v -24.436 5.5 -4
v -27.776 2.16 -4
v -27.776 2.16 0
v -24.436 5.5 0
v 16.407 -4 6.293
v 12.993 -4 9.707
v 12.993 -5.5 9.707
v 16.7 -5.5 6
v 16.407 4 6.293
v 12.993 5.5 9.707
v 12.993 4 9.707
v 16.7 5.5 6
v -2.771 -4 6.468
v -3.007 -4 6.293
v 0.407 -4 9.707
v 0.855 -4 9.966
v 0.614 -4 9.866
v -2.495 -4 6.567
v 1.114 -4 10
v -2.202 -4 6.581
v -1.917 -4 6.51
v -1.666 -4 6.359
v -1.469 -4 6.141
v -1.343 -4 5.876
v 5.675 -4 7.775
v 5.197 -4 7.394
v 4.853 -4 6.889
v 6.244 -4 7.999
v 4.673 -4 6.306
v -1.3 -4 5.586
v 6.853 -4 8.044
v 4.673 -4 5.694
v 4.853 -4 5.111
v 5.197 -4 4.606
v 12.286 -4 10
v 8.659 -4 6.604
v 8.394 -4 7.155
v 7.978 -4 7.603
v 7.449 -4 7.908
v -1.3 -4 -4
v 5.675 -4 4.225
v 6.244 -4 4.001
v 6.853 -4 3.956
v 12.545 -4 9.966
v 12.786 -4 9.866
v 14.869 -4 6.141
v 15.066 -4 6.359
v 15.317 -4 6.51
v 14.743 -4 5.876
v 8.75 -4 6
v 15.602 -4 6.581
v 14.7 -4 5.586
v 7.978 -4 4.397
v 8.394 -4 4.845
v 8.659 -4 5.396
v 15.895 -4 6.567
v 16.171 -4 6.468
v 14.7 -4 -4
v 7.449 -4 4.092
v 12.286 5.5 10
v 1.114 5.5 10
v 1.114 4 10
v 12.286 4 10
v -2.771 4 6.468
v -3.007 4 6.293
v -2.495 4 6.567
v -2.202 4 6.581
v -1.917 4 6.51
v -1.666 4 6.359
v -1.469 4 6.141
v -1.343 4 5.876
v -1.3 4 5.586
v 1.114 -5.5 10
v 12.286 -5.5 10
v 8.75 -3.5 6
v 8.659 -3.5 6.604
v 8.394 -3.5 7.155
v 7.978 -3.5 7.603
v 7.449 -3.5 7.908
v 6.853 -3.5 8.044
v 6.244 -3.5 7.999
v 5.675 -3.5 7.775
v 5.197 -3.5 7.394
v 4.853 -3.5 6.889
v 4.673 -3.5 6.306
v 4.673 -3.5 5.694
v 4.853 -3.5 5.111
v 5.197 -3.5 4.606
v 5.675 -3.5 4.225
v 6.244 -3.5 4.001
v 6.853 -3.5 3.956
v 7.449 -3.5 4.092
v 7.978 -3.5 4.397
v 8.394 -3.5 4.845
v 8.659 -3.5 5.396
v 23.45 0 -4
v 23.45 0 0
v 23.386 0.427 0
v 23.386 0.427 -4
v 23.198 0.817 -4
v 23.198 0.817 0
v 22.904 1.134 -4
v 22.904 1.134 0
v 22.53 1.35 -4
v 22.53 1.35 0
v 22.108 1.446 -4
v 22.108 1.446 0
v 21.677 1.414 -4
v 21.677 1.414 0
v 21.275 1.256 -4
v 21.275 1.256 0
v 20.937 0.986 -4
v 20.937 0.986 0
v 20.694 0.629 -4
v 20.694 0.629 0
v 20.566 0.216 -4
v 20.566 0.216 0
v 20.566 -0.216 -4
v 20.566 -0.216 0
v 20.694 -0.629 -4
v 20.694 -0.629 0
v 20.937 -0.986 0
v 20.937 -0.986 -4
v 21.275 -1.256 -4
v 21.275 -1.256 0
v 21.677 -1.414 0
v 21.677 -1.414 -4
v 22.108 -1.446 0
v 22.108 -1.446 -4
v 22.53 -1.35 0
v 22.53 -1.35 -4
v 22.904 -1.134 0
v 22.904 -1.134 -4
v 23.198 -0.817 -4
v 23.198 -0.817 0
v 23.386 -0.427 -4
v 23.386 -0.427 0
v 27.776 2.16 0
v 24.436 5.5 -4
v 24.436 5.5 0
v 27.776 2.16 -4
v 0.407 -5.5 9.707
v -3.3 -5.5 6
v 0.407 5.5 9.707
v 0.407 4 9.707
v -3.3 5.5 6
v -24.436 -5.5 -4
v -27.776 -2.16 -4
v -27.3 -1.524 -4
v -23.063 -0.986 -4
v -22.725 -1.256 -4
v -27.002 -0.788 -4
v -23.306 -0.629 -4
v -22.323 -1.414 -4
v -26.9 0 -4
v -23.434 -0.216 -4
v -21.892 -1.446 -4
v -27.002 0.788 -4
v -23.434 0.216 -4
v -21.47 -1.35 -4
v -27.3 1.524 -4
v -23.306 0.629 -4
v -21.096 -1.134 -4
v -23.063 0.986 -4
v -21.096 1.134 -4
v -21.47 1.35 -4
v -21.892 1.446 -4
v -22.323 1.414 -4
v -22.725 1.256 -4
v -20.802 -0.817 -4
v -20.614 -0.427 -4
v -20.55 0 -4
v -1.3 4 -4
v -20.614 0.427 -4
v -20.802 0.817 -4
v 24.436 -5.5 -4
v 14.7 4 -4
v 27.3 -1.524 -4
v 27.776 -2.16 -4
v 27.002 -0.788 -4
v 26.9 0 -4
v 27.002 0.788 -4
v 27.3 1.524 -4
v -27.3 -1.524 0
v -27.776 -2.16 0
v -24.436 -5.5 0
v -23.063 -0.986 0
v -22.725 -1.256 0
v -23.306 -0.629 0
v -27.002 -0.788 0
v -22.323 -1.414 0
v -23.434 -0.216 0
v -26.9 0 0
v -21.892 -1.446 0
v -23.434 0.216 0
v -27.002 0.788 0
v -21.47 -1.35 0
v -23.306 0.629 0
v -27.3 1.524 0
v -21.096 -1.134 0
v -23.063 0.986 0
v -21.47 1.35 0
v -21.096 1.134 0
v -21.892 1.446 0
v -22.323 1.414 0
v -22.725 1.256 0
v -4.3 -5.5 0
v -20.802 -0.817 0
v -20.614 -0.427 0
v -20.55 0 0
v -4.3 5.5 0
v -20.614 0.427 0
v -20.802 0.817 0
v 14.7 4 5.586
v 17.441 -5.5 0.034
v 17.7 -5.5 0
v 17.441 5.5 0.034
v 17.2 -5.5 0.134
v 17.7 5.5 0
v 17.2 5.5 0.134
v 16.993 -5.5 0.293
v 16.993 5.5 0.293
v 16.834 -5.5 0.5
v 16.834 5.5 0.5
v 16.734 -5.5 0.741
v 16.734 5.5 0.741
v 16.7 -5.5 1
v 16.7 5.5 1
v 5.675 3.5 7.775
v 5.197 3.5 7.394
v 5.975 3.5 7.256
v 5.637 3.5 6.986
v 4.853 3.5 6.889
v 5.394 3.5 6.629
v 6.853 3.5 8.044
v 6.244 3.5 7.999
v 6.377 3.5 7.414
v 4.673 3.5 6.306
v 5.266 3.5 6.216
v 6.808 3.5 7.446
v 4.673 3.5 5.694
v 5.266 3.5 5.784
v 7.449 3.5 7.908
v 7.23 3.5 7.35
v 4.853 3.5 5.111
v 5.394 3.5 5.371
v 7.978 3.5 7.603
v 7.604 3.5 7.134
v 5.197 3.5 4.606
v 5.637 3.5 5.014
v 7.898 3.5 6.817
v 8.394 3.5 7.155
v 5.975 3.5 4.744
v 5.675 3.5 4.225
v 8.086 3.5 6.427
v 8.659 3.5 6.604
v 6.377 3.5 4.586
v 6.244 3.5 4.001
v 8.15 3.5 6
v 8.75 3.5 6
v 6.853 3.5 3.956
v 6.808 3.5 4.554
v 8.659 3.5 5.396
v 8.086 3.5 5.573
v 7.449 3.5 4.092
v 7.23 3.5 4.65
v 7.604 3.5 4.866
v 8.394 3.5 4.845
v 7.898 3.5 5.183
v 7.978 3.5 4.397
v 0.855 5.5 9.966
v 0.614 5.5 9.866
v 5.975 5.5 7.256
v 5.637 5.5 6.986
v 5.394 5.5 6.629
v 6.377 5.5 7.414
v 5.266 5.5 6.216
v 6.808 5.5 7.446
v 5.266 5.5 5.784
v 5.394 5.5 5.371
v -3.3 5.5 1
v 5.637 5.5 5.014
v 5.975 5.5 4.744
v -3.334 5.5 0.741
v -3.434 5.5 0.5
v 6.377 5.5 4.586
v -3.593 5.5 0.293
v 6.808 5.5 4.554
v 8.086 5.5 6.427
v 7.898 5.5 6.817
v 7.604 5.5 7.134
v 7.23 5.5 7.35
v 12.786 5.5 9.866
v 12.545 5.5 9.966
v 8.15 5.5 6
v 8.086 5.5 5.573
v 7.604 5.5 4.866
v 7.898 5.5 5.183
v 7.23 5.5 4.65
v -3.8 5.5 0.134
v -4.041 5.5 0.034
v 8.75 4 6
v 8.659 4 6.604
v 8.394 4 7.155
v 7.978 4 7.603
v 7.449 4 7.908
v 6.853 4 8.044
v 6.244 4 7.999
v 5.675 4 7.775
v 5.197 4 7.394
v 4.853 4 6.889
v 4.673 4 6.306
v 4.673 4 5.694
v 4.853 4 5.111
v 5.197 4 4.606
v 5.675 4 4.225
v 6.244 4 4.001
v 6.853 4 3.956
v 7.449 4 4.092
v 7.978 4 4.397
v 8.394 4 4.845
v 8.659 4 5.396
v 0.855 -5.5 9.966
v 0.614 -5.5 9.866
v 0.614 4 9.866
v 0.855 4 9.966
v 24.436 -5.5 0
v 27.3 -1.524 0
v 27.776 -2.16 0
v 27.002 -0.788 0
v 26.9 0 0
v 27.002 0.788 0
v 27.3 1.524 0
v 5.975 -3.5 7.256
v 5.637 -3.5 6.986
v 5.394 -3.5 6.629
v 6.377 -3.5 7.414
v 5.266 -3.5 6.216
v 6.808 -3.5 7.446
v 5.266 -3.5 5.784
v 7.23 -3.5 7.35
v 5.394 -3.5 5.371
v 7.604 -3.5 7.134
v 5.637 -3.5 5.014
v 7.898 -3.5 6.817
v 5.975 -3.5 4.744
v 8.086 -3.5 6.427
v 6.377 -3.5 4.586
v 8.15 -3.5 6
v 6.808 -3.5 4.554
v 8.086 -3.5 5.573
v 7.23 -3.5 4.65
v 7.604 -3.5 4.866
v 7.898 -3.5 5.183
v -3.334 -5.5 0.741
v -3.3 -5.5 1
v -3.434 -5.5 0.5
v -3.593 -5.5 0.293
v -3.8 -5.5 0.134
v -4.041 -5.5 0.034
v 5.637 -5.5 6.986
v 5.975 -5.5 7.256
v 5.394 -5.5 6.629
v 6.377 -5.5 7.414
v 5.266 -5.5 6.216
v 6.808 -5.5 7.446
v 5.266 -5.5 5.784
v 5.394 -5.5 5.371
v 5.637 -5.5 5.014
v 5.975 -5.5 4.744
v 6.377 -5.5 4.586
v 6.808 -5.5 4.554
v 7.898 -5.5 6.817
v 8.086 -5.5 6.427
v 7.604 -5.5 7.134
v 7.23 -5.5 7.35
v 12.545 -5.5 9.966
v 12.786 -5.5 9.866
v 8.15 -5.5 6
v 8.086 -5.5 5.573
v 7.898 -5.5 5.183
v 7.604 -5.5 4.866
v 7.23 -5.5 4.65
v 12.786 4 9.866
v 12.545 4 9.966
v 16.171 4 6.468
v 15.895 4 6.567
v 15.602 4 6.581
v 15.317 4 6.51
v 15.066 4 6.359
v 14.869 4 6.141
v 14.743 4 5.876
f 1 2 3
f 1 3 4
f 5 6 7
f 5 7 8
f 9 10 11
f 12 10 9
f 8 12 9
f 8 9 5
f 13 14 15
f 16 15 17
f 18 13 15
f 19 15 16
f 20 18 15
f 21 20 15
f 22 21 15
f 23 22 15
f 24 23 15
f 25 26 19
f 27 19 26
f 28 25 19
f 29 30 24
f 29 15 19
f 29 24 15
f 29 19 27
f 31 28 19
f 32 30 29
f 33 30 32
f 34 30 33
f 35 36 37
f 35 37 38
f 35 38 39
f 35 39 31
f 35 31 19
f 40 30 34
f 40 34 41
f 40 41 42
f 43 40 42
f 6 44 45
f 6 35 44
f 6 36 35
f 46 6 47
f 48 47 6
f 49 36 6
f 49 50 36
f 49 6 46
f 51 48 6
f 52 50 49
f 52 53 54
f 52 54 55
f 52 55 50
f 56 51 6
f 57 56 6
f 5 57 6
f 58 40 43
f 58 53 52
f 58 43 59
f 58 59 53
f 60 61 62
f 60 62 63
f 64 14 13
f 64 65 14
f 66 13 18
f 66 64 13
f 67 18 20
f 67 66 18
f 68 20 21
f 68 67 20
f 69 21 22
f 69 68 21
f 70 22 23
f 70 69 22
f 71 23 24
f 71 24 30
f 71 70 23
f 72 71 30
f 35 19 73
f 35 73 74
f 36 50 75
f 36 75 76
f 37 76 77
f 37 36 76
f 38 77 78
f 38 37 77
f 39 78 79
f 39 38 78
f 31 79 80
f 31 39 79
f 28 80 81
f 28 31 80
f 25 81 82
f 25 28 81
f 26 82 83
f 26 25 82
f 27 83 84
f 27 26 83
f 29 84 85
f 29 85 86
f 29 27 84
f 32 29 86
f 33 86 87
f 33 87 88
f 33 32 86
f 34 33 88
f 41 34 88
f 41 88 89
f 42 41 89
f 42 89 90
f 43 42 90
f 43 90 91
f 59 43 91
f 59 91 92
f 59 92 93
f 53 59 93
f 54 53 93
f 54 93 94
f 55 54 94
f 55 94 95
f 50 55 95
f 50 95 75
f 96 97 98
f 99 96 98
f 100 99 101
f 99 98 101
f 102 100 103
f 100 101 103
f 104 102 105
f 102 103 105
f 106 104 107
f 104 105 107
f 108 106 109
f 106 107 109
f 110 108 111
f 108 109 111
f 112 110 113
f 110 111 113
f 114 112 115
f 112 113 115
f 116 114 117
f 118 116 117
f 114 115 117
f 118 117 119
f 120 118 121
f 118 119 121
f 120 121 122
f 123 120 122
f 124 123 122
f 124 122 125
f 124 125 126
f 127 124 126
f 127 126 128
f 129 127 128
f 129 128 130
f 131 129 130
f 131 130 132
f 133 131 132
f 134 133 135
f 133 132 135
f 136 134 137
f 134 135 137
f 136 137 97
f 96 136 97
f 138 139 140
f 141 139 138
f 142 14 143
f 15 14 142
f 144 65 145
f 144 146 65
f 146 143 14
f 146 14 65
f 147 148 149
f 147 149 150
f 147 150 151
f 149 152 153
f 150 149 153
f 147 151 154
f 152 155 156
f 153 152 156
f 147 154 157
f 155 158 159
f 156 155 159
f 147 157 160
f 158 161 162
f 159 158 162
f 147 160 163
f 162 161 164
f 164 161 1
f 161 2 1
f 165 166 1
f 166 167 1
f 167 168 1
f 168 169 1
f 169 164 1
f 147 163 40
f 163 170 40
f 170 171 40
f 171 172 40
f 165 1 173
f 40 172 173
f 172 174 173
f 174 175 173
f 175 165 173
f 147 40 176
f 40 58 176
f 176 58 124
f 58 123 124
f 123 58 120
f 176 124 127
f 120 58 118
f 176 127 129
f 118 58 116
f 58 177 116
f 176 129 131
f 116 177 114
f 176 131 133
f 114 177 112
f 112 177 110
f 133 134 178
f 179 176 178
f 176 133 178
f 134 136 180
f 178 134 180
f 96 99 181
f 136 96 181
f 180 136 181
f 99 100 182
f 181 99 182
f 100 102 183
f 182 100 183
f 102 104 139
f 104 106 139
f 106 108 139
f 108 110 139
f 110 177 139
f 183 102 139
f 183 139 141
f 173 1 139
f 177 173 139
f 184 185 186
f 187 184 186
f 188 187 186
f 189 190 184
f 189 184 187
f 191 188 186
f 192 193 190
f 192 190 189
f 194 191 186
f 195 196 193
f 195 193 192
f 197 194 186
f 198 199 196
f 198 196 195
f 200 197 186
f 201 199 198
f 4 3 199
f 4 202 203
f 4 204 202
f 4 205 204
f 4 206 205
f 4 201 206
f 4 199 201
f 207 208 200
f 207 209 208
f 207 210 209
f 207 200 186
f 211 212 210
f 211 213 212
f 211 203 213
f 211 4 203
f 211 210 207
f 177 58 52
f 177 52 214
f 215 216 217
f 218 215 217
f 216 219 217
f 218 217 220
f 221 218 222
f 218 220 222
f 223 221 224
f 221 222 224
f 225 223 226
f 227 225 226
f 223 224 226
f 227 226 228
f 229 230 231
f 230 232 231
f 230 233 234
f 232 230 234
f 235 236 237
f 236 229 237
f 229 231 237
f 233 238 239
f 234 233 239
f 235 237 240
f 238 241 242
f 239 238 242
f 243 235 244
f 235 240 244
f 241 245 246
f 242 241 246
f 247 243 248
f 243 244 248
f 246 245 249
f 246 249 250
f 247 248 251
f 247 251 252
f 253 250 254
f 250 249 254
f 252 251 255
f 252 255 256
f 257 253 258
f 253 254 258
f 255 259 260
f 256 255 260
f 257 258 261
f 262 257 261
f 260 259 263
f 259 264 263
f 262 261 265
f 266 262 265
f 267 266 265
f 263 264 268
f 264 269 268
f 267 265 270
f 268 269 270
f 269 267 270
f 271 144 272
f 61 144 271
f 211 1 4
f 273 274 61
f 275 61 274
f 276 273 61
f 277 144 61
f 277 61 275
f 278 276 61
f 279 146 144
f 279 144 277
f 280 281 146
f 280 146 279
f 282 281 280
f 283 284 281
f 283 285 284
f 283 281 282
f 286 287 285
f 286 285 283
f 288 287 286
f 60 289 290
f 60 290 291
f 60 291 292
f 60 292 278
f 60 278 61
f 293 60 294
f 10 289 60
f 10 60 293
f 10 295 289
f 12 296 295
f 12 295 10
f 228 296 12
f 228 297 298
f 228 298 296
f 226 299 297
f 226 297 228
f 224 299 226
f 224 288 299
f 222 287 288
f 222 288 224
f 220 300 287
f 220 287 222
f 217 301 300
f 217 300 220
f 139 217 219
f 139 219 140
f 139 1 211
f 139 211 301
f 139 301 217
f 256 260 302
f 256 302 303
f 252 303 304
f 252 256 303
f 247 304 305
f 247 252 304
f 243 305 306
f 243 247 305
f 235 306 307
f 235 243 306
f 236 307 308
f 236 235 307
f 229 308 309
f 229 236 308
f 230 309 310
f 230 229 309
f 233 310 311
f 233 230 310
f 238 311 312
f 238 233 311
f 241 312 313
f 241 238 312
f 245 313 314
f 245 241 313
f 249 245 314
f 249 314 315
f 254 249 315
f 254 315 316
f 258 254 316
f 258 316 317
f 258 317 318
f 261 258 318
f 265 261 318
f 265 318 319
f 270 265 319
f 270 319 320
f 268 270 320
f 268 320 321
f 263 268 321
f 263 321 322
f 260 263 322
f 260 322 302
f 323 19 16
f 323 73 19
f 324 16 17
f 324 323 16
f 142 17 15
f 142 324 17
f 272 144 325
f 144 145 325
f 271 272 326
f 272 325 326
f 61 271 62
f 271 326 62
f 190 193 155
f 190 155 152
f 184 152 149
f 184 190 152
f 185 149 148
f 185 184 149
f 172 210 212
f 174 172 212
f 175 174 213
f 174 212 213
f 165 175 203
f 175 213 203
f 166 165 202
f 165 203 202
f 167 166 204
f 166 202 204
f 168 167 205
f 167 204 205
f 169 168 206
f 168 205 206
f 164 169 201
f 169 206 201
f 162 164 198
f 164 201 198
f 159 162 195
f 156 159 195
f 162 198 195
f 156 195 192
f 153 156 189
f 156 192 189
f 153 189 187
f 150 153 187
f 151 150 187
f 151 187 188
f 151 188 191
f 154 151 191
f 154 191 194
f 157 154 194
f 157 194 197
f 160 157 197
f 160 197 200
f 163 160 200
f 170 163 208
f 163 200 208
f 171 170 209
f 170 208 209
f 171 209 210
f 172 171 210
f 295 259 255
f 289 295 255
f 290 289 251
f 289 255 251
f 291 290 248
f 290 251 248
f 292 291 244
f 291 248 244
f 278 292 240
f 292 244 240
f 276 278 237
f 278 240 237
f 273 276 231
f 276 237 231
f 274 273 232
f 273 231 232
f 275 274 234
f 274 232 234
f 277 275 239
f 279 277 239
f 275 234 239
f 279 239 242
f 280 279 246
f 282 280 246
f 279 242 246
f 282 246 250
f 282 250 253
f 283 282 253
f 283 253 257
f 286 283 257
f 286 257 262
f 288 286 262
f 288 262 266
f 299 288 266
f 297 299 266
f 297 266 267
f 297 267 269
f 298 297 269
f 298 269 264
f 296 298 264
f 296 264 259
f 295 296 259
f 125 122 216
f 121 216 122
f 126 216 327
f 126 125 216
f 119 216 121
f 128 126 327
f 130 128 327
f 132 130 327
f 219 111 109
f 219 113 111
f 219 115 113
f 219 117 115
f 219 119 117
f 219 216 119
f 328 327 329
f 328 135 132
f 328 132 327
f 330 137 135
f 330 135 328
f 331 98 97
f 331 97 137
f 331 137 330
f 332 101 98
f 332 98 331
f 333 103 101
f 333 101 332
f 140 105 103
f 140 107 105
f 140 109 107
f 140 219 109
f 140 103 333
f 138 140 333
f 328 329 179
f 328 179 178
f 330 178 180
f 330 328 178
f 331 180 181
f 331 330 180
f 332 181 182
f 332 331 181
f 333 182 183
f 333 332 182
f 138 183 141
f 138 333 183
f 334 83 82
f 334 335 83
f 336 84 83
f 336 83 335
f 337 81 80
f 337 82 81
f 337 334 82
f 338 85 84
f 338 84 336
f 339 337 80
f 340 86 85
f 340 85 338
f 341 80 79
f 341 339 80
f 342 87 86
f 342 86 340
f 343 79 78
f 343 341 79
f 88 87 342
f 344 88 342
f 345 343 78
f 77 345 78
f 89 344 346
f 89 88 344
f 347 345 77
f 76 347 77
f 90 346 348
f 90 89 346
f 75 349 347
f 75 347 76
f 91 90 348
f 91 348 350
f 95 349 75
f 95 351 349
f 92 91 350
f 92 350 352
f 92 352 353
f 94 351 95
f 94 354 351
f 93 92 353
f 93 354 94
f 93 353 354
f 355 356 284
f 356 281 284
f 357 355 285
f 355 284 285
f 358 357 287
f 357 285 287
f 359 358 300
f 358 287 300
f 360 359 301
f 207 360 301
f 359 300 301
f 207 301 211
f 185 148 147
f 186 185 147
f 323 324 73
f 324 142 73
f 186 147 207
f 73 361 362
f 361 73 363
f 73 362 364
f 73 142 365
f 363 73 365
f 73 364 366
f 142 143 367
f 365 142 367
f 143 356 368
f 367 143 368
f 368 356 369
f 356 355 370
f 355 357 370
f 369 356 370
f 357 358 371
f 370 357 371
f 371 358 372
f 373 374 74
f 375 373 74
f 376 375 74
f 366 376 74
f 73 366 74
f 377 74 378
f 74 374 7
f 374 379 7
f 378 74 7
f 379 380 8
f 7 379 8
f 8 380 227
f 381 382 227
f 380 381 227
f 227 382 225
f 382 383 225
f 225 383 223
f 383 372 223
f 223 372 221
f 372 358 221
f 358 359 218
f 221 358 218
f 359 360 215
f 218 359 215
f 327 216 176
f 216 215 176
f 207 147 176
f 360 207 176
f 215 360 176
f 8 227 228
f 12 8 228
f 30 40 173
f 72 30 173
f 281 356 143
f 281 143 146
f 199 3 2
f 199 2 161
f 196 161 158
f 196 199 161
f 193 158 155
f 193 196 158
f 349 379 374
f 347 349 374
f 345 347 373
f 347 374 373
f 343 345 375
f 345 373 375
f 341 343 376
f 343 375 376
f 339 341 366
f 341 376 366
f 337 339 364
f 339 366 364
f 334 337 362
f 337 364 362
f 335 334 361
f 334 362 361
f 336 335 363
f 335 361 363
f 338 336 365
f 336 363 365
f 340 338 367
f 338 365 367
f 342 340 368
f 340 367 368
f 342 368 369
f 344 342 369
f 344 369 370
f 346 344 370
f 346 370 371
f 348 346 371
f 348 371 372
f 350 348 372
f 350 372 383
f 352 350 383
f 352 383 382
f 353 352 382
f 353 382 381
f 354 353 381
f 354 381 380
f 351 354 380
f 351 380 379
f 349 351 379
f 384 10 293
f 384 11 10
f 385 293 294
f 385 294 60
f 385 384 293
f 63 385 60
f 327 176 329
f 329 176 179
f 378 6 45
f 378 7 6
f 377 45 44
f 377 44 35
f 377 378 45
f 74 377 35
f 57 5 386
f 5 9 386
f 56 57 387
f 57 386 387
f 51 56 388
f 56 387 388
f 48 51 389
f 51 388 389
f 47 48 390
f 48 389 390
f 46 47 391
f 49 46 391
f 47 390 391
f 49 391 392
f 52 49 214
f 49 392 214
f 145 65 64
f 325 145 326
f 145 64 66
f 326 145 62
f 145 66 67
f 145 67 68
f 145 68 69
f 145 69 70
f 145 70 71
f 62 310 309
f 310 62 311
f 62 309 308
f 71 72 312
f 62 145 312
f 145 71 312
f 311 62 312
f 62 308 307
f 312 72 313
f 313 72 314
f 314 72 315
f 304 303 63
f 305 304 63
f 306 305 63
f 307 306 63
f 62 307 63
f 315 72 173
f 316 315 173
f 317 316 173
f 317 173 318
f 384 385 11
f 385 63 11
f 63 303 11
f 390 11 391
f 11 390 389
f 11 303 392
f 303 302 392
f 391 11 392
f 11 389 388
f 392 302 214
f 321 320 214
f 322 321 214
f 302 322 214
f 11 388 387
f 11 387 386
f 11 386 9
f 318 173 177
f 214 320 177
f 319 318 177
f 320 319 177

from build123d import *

# Parameters (mm, degrees)
F0_R        = 1.45
F0_W        = 20
F0_H        = 11
F0_W_2      = 16
F0_H_2      = 8
F1_DEPTH    = 4
F2_DEPTH    = 10
F3_R        = 1.45
F4_DEPTH    = 25
F3_R_2      = 2.05
F5_DEPTH    = 11
F0_W_3      = 5
F0_H_3      = 7
F6_DEPTH    = 25
F7_T1_DEPTH = 31.5734639037
F7_T3_DEPTH = 24.5734639037
F8_R        = 1


# Not quite as in the source:
# - a fillet or chamfer that OpenCascade refuses, or shapes differently, is made with other operations: its cross-section is extruded or revolved along the edge and cut away or added


with BuildPart() as f1:
    # F0 (on Top) → F1 (new body)
    with BuildSketch(Plane.XY):
        with BuildLine():
            ThreePointArc((-28.4361224622, 2.6766185844), (-27.3113181327, 1.54304563), (-26.9, 0))
            ThreePointArc((-26.9, 0), (-27.3113181327, -1.54304563), (-28.4361224622, -2.6766185844))
            Line((-28.4361224622, -2.6766185844), (-28.4361224622, -5.5))
            Line((-28.4361224622, -5.5), (-3.3, -5.5))
            Line((-3.3, -5.5), (-3.3, 5.5))
            Line((-3.3, 5.5), (-28.4361224622, 5.5))
            Line((-28.4361224622, 5.5), (-28.4361224622, 2.6766185844))
        make_face()
        with Locations((-22, 0)):
            Circle(F0_R, mode=Mode.SUBTRACT)
        with BuildLine():
            Line((28.4361224622, 5.5), (16.7, 5.5))
            Line((16.7, 5.5), (16.7, -5.5))
            Line((16.7, -5.5), (28.4361224622, -5.5))
            Line((28.4361224622, -5.5), (28.4361224622, -2.6766185844))
            ThreePointArc((28.4361224622, -2.6766185844), (26.9, 0), (28.4361224622, 2.6766185844))
            Line((28.4361224622, 2.6766185844), (28.4361224622, 5.5))
        make_face()
        with Locations((22, 0)):
            Circle(F0_R, mode=Mode.SUBTRACT)
        with Locations((6.7, 0)):
            Rectangle(F0_W, F0_H)
        with Locations((6.7, 0)):
            Rectangle(F0_W_2, F0_H_2, mode=Mode.SUBTRACT)
    extrude(amount=-F1_DEPTH)

    # F0 (on Top) → F2 (join)
    with BuildSketch(Plane.XY):
        with Locations((6.7, 0)):
            Rectangle(F0_W, F0_H)
        with Locations((6.7, 0)):
            Rectangle(F0_W_2, F0_H_2, mode=Mode.SUBTRACT)
    extrude(amount=F2_DEPTH)

    # F3 (on face) → F4 (cut)
    with BuildSketch(Plane.XZ.offset(5.5)):
        with Locations((6.7, 6)):
            Circle(F3_R)
    extrude(amount=-F4_DEPTH, mode=Mode.SUBTRACT)

    # F3 (on face) → F5 (join, through all)
    with BuildSketch(Plane.XZ.offset(5.5)):
        with Locations((6.7, 6)):
            Circle(F3_R_2)
        with Locations((6.7, 6)):
            Circle(F3_R, mode=Mode.SUBTRACT)
    extrude(amount=-F5_DEPTH)

    # F0 (on Top) → F6 (cut)
    with BuildSketch(Plane.XY):
        with Locations((6.7, 0)):
            Rectangle(F0_W_3, F0_H_3)
    extrude(amount=F6_DEPTH, mode=Mode.SUBTRACT)

    # F7: chamfer of 4 on 6 edges, made by hand

    # F7_s2 → F7_t1 (cut)
    with BuildSketch(Plane.XZ.offset(-15.7867319519)):
        Polygon((-3.3, 6), (0.7, 10), (-3.3, 10), align=None)
        Polygon((12.7, 10), (16.7, 6), (16.7, 10), align=None)
    extrude(amount=F7_T1_DEPTH, mode=Mode.SUBTRACT)

    # F7_s4 → F7_t3 (cut)
    with BuildSketch(Plane.XY.offset(-14.2867319519)):
        Polygon((-28.4361224622, -1.5), (-24.4361224622, -5.5), (-28.4361224622, -5.5), align=None)
        Polygon((-28.4361224622, 1.5), (-24.4361224622, 5.5), (-28.4361224622, 5.5), align=None)
        Polygon((24.4361224622, -5.5), (28.4361224622, -1.5), (28.4361224622, -5.5), align=None)
        Polygon((24.4361224622, 5.5), (28.4361224622, 1.5), (28.4361224622, 5.5), align=None)
    extrude(amount=F7_T3_DEPTH, mode=Mode.SUBTRACT)

    # F8
    f8_edges = [f1.edges().sort_by_distance(p)[0] for p in [
        (-1.3, 0, 8),
        (14.7, 0, 8),
        (0.7, 4.75, 10),
        (0.7, -4.75, 10),
        (12.7, -4.75, 10),
        (12.7, 4.75, 10),
        (-3.3, 0, 0),
        (16.7, 0, 0),
    ]]
    fillet(f8_edges, radius=F8_R)


solid = f1.part
